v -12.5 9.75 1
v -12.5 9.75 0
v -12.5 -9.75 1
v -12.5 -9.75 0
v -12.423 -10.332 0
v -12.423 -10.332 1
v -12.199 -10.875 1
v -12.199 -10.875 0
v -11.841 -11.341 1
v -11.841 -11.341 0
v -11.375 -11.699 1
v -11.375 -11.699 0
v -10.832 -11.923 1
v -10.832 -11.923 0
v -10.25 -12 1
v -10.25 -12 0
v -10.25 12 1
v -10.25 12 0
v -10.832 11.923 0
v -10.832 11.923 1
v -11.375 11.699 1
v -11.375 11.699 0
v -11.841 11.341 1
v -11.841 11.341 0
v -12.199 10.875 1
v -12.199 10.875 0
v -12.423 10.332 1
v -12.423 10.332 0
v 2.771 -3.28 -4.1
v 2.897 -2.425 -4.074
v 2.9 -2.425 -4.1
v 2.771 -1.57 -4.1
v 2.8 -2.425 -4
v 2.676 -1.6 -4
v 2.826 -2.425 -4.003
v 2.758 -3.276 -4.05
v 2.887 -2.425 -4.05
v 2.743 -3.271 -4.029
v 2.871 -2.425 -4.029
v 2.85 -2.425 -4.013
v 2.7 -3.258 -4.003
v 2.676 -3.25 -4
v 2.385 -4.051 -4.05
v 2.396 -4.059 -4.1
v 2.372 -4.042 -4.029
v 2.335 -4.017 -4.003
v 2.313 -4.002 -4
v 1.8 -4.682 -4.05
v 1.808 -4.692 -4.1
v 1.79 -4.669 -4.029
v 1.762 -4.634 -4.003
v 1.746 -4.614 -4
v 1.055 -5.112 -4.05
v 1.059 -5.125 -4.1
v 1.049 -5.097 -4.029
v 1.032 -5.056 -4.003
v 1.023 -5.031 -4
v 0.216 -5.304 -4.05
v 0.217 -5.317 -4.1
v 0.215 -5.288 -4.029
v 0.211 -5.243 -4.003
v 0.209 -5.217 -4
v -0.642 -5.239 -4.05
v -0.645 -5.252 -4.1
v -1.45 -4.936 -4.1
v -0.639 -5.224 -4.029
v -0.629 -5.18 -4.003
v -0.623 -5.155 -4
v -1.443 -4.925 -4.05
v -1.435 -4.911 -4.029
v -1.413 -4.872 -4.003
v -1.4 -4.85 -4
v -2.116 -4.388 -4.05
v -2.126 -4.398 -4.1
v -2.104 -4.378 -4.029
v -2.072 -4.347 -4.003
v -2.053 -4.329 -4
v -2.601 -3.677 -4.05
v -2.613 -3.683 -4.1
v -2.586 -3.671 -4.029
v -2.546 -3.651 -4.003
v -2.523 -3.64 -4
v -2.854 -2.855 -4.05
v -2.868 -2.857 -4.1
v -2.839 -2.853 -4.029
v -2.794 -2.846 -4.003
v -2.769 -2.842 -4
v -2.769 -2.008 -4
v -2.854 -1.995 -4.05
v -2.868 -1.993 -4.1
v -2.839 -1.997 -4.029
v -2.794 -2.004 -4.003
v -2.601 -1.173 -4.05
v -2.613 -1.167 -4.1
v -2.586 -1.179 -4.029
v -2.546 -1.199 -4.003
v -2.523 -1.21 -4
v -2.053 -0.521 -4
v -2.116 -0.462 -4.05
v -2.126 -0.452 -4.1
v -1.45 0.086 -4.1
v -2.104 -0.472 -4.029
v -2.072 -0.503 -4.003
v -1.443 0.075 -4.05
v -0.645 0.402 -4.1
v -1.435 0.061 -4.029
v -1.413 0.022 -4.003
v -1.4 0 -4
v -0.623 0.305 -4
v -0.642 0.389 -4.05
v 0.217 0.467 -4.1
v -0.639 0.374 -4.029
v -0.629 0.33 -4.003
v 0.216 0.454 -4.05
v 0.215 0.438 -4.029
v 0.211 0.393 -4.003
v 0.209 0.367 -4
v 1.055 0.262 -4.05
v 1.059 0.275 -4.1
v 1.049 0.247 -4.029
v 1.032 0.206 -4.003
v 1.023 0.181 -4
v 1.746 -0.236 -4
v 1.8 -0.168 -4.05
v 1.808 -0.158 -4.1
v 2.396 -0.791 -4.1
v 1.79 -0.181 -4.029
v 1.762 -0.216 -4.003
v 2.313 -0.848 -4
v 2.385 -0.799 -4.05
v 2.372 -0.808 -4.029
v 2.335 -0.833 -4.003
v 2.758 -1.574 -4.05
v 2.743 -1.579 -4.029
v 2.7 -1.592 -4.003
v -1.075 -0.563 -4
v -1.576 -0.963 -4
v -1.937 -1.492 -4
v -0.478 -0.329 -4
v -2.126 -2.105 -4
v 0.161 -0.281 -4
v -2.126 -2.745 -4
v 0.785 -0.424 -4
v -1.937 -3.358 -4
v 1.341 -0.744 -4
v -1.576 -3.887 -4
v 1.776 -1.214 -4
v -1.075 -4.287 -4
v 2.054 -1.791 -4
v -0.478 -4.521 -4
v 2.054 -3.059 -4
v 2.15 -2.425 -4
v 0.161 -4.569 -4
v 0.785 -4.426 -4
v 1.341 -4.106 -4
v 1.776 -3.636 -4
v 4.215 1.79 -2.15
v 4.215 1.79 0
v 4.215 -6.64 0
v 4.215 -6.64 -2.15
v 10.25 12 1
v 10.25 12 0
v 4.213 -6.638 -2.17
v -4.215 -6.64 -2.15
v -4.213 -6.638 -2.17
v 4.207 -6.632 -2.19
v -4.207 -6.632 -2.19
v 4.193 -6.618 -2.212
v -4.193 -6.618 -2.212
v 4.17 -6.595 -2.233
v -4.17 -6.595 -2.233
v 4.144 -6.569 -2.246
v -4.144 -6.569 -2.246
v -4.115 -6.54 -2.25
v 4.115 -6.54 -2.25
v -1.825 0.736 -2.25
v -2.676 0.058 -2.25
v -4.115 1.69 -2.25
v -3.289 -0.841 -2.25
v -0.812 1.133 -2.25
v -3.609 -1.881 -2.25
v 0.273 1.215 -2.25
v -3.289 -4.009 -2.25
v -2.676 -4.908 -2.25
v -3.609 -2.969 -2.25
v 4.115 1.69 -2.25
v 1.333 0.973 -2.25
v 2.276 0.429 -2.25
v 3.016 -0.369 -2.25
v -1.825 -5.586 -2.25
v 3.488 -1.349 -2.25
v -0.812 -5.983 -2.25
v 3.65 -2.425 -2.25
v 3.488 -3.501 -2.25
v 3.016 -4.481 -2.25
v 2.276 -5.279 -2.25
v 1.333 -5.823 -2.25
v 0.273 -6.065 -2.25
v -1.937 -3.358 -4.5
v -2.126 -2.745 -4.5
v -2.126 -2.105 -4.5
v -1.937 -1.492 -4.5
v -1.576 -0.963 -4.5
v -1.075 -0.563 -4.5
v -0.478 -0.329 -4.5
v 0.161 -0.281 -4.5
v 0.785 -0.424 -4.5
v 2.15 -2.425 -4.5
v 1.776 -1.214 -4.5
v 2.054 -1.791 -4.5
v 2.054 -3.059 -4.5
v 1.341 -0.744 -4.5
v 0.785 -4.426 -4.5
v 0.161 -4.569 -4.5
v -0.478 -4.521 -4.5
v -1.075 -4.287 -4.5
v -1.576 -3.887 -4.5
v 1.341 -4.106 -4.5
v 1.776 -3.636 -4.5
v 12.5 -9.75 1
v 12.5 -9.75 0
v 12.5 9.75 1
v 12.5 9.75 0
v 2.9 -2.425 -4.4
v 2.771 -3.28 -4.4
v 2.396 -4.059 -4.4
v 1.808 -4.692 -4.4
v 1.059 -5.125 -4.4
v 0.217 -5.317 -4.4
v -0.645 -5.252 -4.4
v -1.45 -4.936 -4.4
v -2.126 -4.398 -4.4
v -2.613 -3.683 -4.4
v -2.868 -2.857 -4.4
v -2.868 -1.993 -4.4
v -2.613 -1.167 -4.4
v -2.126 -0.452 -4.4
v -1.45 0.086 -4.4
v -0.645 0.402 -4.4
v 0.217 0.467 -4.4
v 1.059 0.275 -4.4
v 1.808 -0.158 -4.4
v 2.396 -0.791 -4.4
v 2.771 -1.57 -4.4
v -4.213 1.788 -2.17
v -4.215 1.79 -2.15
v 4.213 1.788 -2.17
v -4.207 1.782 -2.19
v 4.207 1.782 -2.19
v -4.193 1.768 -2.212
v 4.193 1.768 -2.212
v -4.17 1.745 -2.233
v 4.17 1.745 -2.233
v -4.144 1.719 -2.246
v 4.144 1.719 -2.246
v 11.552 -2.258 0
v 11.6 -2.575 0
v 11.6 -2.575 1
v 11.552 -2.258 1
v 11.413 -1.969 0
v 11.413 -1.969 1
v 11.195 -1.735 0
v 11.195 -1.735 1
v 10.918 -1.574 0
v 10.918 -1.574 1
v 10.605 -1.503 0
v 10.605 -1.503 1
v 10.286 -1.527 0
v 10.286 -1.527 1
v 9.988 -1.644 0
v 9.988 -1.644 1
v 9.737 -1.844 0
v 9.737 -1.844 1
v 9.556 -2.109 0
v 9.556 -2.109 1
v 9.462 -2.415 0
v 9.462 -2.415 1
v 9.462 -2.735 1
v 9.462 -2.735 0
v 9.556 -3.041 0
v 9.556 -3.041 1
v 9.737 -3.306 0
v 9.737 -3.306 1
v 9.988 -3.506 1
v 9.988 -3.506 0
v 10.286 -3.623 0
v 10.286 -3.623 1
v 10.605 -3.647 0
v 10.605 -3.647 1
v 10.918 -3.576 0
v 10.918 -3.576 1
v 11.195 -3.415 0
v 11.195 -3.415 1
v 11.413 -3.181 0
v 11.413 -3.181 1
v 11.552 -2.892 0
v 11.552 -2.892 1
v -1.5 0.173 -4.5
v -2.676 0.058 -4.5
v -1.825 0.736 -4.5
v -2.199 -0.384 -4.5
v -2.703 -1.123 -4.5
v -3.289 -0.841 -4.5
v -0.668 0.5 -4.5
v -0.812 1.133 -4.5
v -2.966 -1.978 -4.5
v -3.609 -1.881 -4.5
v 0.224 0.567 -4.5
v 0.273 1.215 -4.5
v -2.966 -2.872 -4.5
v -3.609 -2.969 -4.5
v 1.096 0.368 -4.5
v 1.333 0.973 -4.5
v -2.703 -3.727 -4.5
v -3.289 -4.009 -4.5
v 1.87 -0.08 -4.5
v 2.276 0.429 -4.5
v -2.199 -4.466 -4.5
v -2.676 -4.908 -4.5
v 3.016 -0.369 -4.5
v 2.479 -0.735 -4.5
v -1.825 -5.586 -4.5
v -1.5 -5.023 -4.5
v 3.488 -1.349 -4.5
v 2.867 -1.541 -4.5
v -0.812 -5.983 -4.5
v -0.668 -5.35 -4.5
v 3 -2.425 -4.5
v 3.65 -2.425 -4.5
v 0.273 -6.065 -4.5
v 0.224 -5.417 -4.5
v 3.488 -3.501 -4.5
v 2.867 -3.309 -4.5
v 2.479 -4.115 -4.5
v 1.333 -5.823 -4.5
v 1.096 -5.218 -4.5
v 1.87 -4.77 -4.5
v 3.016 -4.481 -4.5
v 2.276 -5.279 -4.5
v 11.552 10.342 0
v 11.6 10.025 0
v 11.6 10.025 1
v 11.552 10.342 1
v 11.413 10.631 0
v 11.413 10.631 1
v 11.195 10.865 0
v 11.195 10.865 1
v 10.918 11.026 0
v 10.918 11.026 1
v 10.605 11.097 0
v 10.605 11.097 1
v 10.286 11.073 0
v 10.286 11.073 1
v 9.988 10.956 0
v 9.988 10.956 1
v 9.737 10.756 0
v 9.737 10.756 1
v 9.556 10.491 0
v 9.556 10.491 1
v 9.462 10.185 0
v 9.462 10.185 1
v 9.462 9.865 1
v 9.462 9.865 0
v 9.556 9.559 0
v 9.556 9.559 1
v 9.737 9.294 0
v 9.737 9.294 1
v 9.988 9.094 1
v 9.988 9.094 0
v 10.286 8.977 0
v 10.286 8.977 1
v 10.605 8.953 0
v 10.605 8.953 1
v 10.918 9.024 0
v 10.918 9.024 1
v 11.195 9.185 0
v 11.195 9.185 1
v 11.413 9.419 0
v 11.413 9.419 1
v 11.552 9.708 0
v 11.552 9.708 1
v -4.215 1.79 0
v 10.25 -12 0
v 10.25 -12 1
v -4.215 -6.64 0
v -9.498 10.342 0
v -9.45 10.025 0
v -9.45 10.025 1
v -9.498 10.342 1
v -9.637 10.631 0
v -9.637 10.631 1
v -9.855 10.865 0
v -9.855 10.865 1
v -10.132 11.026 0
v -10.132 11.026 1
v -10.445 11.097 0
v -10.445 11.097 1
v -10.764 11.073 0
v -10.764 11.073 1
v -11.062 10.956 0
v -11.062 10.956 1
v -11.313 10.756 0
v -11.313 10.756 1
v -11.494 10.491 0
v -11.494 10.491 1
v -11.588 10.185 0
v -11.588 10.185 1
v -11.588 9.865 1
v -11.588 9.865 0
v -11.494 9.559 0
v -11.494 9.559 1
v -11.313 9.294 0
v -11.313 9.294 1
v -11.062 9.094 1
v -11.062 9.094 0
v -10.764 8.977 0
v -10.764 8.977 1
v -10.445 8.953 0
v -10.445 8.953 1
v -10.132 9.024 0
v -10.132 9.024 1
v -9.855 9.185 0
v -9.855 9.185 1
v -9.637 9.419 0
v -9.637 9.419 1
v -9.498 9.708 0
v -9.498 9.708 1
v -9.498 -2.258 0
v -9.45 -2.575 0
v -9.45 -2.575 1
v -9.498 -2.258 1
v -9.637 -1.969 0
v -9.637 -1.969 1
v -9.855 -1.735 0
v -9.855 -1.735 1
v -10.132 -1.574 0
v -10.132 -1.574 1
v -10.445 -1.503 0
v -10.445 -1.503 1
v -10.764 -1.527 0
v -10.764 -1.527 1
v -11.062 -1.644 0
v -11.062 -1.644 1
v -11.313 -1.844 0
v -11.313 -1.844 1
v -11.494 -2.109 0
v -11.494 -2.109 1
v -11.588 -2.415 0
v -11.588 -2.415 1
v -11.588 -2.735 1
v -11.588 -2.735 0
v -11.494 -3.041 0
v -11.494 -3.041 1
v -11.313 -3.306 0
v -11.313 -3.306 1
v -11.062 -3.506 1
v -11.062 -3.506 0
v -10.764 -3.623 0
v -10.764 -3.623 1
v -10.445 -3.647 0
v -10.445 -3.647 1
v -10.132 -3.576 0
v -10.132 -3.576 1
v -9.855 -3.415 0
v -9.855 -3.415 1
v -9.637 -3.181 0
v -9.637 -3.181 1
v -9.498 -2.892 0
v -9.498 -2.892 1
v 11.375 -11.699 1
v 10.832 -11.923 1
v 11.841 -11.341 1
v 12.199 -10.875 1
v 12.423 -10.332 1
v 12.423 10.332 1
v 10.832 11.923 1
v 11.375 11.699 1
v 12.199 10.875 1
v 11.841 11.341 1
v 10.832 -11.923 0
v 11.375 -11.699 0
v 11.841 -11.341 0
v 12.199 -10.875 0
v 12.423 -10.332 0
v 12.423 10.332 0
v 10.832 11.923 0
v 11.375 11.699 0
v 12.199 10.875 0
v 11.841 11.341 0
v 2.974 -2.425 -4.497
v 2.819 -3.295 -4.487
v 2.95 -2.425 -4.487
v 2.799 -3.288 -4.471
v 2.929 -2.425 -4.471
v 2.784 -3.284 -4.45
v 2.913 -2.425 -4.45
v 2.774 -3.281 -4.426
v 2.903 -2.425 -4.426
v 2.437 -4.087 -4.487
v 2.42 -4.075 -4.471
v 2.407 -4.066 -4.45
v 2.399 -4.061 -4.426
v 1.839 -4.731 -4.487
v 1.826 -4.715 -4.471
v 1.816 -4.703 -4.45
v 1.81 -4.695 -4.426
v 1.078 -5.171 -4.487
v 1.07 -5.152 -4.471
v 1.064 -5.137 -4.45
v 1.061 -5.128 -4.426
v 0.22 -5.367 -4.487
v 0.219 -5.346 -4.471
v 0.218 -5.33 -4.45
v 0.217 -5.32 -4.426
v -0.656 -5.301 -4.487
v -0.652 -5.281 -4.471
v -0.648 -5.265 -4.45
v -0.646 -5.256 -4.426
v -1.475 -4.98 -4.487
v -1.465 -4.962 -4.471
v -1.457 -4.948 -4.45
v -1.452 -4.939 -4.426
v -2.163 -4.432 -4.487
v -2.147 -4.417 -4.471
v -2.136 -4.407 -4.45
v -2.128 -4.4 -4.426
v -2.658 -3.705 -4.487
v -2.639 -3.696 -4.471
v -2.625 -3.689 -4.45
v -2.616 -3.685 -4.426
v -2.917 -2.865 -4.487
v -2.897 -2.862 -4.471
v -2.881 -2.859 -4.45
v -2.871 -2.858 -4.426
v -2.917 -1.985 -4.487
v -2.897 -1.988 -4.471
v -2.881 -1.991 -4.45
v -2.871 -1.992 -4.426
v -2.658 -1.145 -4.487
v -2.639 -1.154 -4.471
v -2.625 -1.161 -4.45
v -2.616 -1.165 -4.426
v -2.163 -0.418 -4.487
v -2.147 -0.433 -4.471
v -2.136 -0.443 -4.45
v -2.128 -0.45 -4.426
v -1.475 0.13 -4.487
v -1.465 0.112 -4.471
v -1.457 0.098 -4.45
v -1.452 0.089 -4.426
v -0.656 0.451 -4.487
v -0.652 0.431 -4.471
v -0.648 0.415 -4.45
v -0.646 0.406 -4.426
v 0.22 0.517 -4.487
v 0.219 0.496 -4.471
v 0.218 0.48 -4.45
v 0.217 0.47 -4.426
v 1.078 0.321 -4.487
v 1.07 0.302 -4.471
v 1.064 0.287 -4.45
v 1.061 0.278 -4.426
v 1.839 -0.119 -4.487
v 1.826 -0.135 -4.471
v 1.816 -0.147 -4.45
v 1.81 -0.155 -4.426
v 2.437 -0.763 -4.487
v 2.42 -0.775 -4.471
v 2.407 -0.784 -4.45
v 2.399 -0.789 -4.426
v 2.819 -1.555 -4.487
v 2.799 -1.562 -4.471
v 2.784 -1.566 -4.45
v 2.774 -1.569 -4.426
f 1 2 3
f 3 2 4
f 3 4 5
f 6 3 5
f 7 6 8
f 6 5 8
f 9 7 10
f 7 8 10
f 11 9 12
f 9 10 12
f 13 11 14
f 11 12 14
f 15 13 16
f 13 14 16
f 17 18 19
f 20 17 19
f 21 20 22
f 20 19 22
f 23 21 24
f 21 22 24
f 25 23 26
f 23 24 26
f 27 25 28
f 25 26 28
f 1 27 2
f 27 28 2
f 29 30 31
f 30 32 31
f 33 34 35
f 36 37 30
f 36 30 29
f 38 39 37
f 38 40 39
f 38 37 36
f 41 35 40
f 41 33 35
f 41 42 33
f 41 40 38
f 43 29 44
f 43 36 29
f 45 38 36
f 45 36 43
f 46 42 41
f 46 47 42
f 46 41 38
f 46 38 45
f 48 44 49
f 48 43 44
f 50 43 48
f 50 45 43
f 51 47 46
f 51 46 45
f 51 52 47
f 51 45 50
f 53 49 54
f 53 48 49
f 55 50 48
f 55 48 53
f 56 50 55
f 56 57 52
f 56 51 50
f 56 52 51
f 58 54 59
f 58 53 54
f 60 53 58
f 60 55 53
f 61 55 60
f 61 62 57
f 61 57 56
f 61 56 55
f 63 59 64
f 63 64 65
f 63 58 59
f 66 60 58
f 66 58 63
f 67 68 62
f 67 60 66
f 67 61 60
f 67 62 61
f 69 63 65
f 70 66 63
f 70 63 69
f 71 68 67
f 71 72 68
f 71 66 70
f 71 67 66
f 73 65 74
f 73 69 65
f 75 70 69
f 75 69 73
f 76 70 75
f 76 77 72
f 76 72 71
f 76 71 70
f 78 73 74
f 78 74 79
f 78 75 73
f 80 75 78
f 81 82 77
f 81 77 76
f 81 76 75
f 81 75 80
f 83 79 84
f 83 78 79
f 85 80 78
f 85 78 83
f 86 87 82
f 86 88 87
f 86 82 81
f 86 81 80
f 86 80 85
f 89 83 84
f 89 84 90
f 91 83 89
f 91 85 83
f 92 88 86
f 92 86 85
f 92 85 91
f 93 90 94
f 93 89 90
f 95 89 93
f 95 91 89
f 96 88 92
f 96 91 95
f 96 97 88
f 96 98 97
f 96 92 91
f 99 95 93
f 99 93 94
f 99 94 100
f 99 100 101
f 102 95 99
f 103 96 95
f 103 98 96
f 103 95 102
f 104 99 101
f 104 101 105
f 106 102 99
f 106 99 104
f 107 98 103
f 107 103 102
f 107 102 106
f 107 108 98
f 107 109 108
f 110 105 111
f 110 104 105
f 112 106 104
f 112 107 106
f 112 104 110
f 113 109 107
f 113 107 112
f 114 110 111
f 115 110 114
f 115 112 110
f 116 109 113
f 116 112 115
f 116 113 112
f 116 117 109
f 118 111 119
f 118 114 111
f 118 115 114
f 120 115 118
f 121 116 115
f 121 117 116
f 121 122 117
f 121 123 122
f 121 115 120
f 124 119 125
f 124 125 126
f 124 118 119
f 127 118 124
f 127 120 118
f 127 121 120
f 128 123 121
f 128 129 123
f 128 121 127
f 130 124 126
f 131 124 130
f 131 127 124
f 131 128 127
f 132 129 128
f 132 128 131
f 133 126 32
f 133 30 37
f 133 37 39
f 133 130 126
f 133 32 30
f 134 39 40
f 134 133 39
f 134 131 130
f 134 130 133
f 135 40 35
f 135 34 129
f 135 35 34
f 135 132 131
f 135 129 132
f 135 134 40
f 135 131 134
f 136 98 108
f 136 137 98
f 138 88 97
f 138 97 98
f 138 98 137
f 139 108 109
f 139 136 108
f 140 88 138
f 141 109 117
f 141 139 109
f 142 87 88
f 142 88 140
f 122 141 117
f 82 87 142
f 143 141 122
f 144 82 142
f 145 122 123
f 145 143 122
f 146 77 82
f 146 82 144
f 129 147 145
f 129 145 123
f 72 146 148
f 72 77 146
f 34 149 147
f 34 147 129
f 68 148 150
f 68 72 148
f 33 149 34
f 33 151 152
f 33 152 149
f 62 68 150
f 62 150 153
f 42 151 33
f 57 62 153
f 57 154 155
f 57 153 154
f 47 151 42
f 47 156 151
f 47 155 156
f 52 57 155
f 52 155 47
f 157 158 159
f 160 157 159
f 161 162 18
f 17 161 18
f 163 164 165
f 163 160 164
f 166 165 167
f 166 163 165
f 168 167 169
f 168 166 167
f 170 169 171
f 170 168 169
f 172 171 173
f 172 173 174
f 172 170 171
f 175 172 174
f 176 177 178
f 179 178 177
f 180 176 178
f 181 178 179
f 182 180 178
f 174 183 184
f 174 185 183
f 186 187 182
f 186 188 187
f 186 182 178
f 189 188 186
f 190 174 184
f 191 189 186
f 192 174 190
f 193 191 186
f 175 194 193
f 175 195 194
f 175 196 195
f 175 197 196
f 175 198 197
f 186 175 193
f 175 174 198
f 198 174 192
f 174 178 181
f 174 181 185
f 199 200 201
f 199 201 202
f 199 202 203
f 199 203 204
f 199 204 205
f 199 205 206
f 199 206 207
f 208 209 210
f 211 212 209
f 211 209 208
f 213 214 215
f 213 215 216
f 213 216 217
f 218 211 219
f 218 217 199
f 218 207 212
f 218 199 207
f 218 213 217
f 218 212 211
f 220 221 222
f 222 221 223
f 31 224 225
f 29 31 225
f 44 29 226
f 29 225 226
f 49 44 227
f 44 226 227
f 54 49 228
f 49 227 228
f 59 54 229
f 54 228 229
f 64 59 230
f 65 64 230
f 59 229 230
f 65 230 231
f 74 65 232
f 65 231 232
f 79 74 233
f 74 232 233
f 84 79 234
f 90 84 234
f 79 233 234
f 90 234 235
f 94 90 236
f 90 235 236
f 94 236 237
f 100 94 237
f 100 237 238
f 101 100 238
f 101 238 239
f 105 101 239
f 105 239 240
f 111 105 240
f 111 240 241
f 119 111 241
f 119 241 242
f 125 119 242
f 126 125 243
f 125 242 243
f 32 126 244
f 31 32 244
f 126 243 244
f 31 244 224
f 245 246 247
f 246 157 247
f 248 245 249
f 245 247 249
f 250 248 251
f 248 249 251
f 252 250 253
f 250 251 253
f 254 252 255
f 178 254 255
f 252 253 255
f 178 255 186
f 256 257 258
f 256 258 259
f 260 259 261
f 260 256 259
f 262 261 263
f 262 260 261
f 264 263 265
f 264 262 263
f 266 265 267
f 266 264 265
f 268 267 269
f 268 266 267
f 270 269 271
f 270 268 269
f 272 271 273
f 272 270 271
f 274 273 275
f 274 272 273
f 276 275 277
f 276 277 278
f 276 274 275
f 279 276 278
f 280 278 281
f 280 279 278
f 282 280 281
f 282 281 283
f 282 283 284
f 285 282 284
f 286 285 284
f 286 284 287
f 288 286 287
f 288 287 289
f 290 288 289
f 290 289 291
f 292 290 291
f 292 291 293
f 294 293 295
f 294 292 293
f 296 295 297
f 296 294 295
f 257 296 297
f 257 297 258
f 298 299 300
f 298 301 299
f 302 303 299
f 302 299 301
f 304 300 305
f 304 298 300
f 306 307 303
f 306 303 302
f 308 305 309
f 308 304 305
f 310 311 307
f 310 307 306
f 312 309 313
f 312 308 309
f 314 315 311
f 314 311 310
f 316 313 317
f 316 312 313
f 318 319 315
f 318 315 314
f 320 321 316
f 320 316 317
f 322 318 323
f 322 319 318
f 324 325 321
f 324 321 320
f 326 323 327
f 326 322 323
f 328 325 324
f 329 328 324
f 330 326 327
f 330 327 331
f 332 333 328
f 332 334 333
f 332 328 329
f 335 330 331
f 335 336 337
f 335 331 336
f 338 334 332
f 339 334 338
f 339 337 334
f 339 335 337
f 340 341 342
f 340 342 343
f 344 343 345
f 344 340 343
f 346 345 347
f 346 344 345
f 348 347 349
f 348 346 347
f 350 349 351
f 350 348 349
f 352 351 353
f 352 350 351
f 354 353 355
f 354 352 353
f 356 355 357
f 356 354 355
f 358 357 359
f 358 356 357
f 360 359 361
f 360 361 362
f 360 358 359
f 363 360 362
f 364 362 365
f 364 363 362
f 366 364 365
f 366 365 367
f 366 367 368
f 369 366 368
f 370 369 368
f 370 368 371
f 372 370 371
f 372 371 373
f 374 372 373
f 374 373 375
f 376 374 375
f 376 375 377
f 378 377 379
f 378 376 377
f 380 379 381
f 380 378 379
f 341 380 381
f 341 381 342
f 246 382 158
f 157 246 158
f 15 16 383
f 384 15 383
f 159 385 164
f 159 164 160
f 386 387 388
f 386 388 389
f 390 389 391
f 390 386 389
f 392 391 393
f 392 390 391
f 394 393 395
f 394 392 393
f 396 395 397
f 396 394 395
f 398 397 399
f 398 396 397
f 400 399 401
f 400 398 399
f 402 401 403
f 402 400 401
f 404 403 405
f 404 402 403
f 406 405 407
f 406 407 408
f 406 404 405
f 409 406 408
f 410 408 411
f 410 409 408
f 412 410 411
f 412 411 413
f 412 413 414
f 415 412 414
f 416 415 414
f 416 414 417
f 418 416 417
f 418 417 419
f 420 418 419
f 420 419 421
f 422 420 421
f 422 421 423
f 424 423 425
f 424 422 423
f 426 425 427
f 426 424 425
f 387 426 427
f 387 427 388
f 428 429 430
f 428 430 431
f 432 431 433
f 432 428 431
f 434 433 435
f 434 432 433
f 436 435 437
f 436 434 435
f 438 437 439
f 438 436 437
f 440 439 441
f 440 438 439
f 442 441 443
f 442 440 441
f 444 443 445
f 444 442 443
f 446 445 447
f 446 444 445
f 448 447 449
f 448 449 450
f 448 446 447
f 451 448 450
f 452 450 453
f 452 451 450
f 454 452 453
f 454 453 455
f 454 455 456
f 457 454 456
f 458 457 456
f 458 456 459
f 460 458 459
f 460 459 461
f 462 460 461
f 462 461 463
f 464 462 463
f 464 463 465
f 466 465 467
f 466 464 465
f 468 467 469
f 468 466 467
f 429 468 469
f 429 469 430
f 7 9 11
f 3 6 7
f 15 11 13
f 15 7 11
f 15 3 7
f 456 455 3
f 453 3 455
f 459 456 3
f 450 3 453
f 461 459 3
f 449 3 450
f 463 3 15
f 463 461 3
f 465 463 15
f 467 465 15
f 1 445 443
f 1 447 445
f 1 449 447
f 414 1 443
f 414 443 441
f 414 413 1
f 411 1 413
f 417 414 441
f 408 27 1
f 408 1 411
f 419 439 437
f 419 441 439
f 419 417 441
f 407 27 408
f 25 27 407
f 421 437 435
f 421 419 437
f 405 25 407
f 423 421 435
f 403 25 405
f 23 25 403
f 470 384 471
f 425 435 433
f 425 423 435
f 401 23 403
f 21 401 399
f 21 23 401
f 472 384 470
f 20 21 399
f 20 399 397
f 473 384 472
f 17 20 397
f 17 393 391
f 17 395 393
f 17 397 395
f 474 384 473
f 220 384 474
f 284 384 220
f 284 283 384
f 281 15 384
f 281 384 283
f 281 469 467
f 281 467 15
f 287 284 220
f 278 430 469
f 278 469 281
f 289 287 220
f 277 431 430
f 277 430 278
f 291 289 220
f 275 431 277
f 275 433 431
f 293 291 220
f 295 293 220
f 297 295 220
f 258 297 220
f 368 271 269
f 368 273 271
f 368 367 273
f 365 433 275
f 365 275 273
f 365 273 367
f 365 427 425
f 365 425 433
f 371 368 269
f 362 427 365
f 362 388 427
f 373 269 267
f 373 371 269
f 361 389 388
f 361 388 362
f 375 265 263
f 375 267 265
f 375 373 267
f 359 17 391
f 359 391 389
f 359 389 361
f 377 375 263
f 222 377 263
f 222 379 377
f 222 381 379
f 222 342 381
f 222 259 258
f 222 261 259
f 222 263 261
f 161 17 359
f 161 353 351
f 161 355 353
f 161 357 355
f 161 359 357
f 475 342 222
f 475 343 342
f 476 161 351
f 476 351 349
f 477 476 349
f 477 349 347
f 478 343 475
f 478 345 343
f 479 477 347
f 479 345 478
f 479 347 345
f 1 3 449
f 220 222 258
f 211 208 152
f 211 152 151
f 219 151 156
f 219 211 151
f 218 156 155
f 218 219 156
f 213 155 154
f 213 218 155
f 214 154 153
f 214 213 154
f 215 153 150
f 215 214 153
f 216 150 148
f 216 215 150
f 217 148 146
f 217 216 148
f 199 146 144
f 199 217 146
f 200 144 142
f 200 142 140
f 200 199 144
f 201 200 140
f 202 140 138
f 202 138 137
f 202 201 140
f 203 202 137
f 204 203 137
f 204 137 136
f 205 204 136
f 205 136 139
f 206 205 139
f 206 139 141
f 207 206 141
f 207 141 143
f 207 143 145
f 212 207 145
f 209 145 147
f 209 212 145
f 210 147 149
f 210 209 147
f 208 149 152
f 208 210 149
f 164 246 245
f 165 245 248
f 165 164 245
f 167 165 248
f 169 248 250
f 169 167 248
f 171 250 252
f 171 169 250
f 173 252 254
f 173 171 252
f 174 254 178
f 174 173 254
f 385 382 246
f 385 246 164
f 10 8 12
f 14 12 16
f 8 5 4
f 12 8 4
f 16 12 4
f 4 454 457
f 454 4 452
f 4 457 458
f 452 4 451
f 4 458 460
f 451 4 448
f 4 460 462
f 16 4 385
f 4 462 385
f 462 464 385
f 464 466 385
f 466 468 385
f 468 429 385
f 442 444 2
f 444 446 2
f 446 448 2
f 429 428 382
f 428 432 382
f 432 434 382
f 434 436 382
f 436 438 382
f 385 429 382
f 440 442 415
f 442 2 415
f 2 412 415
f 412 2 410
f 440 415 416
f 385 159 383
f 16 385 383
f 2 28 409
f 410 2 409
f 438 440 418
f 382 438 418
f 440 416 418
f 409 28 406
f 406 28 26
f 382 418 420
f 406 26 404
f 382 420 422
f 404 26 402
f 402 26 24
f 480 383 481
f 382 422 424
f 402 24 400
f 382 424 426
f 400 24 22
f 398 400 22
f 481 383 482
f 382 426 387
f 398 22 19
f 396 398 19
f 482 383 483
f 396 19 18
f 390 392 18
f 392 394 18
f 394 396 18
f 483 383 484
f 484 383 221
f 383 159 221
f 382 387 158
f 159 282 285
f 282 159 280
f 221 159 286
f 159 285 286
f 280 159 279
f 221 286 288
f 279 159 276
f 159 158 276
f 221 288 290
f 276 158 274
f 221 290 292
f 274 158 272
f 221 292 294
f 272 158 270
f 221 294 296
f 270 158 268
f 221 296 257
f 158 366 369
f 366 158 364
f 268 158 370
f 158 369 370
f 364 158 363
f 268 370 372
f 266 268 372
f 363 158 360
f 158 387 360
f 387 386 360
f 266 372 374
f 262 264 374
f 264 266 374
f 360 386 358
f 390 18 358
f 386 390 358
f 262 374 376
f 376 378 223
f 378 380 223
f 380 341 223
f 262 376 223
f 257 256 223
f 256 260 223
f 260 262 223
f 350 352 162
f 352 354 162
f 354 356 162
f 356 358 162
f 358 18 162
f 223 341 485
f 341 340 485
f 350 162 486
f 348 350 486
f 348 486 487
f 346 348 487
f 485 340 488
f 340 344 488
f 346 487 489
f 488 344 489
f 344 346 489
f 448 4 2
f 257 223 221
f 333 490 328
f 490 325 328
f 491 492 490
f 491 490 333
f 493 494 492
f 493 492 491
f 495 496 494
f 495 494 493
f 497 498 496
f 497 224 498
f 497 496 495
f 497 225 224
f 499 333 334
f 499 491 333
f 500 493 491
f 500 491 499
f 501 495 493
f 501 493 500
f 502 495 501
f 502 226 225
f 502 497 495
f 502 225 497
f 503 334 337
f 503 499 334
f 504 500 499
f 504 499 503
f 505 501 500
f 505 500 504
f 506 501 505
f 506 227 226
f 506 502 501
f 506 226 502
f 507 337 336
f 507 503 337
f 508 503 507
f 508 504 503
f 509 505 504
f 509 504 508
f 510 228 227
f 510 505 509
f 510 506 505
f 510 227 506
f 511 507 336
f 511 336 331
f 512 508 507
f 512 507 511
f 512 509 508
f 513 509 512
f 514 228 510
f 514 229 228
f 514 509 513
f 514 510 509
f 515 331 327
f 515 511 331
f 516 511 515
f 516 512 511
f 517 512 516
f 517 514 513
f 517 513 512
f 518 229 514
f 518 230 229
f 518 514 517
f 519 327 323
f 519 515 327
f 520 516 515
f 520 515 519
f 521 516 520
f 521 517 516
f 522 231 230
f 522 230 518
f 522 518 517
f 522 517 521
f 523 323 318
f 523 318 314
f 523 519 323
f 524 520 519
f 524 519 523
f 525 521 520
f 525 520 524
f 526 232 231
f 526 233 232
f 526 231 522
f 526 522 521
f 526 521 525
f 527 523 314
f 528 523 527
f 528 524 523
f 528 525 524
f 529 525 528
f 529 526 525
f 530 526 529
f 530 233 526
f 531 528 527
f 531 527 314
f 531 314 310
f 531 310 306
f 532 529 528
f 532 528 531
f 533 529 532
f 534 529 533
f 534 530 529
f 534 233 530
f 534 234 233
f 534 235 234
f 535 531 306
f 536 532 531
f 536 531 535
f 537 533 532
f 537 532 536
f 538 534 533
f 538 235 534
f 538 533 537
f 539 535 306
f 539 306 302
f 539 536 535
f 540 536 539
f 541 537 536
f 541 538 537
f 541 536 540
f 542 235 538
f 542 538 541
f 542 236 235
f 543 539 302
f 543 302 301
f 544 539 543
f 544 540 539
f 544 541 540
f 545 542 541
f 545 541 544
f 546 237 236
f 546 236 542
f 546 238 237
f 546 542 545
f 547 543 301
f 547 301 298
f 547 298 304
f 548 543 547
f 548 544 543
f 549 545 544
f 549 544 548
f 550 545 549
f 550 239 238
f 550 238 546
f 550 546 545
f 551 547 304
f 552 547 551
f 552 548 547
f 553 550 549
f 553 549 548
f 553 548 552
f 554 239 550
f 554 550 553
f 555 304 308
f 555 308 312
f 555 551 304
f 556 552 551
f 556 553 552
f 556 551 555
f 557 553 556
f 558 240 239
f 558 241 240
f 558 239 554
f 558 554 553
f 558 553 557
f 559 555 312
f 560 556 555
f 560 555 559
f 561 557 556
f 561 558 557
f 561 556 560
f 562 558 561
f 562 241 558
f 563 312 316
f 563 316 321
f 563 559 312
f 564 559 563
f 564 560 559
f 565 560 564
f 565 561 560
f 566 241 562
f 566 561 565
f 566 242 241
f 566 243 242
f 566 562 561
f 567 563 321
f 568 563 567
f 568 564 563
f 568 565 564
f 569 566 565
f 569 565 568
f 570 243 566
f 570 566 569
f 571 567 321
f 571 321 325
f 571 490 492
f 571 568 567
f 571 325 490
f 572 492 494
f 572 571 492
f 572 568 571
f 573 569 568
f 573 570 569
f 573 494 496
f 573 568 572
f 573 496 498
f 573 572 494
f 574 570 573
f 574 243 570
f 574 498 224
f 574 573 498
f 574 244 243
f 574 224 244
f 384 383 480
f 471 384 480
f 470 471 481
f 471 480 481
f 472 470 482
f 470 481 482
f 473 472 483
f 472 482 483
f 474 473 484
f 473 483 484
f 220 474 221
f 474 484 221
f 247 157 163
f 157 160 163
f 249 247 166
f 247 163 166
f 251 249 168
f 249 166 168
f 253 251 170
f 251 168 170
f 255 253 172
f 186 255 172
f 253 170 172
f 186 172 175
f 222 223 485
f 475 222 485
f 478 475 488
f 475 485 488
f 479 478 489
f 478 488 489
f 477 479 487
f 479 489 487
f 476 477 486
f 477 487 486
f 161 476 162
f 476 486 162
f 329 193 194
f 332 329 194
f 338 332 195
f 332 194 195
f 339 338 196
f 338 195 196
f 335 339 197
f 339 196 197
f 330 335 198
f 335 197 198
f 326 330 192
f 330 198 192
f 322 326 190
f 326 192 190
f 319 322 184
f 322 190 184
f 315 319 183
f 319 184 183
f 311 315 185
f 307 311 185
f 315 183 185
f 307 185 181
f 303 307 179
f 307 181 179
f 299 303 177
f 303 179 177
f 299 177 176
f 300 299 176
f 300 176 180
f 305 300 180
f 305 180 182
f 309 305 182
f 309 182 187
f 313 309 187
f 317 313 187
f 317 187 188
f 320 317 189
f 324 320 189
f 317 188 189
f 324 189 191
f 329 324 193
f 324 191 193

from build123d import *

# Parameters (mm, degrees)
F0_R     = 1.075
F1_DEPTH = 1
F2_W     = 8.43
F2_H     = 8.43
F3_DEPTH = 2.25
F4_R     = 3.65
F5_DEPTH = 2.25
F7_R     = 2.9
F7_R_2   = 2.15
F8_DEPTH = 0.5
F9_R     = 0.1


with BuildPart() as f1:
    # F0 (on Top) → F1 (new body)
    with BuildSketch(Plane.XY):
        with BuildLine():
            ThreePointArc((12.5, 9.75), (11.84099, 11.34099), (10.25, 12))
            Line((10.25, 12), (-10.25, 12))
            ThreePointArc((-10.25, 12), (-11.84099, 11.34099), (-12.5, 9.75))
            Line((-12.5, 9.75), (-12.5, -9.75))
            ThreePointArc((-12.5, -9.75), (-11.84099, -11.34099), (-10.25, -12))
            Line((-10.25, -12), (10.25, -12))
            ThreePointArc((10.25, -12), (11.84099, -11.34099), (12.5, -9.75))
            Line((12.5, -9.75), (12.5, 9.75))
        make_face()
        with Locations((-10.525, -2.575)):
            Circle(F0_R, mode=Mode.SUBTRACT)
        with Locations((10.525, -2.575)):
            Circle(F0_R, mode=Mode.SUBTRACT)
        with Locations((-10.525, 10.025)):
            Circle(F0_R, mode=Mode.SUBTRACT)
        with Locations((10.525, 10.025)):
            Circle(F0_R, mode=Mode.SUBTRACT)
    extrude(amount=F1_DEPTH)

    # F2 (on face) → F3 (join)
    with BuildSketch(Plane(origin=(0, 0, 0), x_dir=(1, 0, 0), z_dir=(0, 0, -1))):
        with Locations((0, 2.425)):
            Rectangle(F2_W, F2_H)
    extrude(amount=F3_DEPTH)

    # F4 (on face) → F5 (join)
    with BuildSketch(Plane(origin=(0, 0, -2.25), x_dir=(1, 0, 0), z_dir=(0, 0, -1))):
        with Locations((0, 2.425)):
            Circle(F4_R)
    extrude(amount=F5_DEPTH)

    # F7 (on face) → F8 (cut)
    with BuildSketch(Plane(origin=(0, 0, -4.5), x_dir=(1, 0, 0), z_dir=(0, 0, -1))):
        with Locations((0, 2.425)):
            Circle(F7_R)
        with Locations((0, 2.425)):
            Circle(F7_R_2, mode=Mode.SUBTRACT)
    extrude(amount=-F8_DEPTH, mode=Mode.SUBTRACT)

    # F9
    f9_edges = [f1.edges().sort_by_distance(p)[0] for p in [
        (-2.9, -2.425, -4),
        (-2.9, -2.425, -4.5),
        (0, 1.79, -2.25),
        (4.215, -2.425, -2.25),
        (0, -6.64, -2.25),
        (-4.215, -2.425, -2.25),
    ]]
    fillet(f9_edges, radius=F9_R)


solid = f1.part
